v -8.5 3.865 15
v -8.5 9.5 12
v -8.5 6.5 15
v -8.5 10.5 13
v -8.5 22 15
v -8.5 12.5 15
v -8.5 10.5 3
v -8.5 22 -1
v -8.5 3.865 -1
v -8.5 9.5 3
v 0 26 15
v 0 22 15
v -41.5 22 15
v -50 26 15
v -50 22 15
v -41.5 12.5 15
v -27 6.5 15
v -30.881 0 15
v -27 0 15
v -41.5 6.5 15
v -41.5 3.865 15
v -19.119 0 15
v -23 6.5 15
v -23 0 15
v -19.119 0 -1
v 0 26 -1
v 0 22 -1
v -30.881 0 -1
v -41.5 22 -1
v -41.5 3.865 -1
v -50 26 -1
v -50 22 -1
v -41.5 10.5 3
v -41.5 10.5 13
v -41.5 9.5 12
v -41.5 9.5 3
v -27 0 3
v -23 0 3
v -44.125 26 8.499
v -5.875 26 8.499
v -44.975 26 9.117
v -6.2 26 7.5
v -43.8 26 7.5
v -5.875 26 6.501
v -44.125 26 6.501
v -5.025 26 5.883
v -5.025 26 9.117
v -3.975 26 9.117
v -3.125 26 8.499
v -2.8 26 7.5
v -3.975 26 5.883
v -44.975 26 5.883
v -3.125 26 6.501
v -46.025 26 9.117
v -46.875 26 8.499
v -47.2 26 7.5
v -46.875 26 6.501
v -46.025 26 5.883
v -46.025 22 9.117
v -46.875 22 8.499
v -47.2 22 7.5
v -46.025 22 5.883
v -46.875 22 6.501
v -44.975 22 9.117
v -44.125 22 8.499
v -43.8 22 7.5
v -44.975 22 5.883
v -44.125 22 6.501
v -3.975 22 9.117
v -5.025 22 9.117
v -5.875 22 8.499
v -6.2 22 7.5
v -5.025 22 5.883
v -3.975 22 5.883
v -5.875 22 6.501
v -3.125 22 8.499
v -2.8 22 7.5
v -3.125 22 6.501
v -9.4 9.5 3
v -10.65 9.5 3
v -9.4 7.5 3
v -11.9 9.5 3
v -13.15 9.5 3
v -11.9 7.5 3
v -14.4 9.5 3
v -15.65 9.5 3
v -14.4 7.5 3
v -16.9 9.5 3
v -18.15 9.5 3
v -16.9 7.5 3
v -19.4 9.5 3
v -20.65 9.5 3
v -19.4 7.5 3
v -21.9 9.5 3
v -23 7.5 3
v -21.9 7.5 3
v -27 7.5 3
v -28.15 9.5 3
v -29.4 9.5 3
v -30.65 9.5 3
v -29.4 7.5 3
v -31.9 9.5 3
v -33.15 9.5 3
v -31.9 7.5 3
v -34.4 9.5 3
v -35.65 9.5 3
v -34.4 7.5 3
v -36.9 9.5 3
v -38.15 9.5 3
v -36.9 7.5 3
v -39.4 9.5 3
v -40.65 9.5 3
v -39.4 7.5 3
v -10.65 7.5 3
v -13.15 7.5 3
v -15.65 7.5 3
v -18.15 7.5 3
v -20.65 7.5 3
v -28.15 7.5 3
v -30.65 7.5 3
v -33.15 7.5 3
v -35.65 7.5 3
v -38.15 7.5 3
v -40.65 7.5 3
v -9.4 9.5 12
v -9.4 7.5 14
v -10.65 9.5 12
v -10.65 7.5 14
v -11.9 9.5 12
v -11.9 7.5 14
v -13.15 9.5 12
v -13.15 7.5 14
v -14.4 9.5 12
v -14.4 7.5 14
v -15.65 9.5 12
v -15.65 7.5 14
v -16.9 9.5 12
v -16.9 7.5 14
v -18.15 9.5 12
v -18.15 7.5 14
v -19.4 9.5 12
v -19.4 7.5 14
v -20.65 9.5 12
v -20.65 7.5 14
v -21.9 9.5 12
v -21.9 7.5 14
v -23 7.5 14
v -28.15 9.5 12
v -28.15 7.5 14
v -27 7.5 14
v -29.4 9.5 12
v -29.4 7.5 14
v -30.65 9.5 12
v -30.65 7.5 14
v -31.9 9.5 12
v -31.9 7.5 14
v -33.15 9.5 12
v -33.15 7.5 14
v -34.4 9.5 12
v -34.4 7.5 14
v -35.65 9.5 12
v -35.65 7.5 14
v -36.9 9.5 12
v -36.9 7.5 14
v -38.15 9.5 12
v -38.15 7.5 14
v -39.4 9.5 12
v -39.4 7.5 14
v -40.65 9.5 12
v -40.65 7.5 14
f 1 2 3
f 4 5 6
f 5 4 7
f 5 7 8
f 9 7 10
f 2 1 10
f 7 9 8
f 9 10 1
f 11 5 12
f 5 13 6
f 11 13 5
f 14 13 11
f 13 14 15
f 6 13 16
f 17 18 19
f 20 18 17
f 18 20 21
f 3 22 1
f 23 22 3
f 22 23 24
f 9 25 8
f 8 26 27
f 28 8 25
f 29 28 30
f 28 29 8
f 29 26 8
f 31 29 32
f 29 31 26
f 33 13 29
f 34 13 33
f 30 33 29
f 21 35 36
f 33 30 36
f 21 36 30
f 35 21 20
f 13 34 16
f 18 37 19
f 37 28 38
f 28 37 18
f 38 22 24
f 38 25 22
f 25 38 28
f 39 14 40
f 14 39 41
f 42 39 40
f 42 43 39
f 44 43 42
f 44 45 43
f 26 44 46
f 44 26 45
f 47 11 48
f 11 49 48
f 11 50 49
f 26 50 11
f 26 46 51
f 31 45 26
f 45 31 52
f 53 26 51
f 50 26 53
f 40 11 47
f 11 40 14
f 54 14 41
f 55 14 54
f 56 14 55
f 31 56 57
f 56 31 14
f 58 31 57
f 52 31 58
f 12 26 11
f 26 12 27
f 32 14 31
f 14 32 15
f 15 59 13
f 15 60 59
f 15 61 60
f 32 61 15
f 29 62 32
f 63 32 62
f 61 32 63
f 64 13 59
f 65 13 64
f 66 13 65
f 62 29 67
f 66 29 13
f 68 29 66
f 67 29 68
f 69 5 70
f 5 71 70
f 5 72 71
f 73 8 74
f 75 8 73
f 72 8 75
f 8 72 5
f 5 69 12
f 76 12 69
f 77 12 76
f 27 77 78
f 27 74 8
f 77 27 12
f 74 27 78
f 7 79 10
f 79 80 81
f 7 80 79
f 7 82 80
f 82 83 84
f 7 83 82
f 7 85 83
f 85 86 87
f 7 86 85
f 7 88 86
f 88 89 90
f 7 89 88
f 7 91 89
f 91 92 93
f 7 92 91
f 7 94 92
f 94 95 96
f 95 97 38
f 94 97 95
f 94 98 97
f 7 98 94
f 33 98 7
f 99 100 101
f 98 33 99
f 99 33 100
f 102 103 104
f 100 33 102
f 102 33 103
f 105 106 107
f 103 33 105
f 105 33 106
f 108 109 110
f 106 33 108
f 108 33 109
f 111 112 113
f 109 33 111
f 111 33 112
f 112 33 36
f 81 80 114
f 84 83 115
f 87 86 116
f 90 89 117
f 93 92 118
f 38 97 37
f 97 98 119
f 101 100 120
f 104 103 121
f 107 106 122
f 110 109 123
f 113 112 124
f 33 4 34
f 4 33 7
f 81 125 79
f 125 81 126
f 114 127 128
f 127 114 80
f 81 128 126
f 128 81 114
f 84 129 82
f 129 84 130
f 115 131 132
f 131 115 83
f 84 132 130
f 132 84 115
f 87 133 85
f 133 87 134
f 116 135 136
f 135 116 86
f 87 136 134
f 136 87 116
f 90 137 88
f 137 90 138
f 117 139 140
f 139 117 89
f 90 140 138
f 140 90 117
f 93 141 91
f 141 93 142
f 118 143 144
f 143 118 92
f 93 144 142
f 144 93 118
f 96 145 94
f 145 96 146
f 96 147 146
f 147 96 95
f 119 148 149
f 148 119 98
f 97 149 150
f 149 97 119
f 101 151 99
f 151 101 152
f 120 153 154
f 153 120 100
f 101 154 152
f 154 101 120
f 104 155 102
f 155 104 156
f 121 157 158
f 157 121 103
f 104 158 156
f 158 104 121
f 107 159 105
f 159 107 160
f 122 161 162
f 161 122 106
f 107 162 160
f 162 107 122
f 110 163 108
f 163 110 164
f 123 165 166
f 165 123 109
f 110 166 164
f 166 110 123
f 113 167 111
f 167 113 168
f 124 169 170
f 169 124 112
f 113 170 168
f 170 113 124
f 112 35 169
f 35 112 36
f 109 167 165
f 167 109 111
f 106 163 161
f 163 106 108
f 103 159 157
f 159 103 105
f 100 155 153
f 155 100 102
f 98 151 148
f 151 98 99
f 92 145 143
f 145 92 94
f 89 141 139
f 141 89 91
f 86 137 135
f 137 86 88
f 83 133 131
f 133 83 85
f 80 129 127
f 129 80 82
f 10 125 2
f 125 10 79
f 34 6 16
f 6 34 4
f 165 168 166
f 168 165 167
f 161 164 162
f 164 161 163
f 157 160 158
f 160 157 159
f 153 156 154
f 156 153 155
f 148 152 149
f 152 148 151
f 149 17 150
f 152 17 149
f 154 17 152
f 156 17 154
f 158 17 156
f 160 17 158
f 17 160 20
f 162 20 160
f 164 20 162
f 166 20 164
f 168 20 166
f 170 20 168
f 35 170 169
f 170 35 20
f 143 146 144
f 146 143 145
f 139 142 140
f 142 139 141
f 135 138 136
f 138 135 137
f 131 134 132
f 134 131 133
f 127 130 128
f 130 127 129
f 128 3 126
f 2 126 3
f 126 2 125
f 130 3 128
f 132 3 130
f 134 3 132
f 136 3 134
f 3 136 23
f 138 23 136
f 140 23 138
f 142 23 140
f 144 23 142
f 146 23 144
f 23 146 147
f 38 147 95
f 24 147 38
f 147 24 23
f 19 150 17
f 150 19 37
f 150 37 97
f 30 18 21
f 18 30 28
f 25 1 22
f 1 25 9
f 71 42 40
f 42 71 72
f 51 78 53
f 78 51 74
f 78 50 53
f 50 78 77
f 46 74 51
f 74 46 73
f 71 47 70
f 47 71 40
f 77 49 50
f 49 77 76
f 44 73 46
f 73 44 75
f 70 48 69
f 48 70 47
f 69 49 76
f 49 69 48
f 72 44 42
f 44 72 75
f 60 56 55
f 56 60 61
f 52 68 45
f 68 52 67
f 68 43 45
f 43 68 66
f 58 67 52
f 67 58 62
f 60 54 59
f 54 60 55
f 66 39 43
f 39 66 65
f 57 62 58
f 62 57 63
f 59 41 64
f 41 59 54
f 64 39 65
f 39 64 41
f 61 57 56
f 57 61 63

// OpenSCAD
// PRUSA iteration3
// Y belt holder
// GNU GPL v3
// Josef Průša <iam@josefprusa.cz> and contributors
// http://www.reprap.org/wiki/Prusa_Mendel
// http://prusamendel.org

module belt_holder_base() {
  translate([-33-8.5,0,-1]) cube([33,15,16]);
  translate([-33-8.5,11,-1]) cube([33,15,16]);
  translate([-50,22,-1]) cube([50,4,16]);
}

module belt_holder_beltcut() {
  belt_tooth_distance = 2.5;
  position_tweak = 1.85; //GT2 0.5
  extra_sep = 0; //GT2 0.25

  // Belt slit
  translate([-66,-0.5-extra_sep+10,3]) cube([67,1+extra_sep,15]);

  // Smooth insert cutout
  translate([-66,-0.5+10,12]) rotate([45,0,0]) cube([67,15,15]);

  // Individual teeth
  for (i = [0 : 23]) {
    translate([0-i*belt_tooth_distance+position_tweak,-0.5+8,3]) cube([belt_tooth_distance/2,3,15]);
  }

  // Middle opening
  translate([-2-25,-1,3]) cube([4,11,15]);
}

module belt_holder_fancy() {
  translate([-33-8.5-4,0,-2]) rotate([0,0,-20]) cube([20,5,19]);
  mirror([1,0,0]) translate([33-8.5-20,0,-2]) rotate([0,0,-20]) cube([20,5,19]);
}

module belt_holder_holes() {
  translate([-4.5,0,7.5]) rotate([-90,0,0]) cylinder(h = 30, r = 1.7, $fn = 10);
  translate([-45.5,0,7.5]) rotate([-90,0,0]) cylinder(h = 30, r = 1.7, $fn = 10);
}

// Final part
module belt_holder() {
  difference() {
    belt_holder_base();
    belt_holder_beltcut();
    belt_holder_fancy();
    belt_holder_holes();
  }
}

belt_holder();
